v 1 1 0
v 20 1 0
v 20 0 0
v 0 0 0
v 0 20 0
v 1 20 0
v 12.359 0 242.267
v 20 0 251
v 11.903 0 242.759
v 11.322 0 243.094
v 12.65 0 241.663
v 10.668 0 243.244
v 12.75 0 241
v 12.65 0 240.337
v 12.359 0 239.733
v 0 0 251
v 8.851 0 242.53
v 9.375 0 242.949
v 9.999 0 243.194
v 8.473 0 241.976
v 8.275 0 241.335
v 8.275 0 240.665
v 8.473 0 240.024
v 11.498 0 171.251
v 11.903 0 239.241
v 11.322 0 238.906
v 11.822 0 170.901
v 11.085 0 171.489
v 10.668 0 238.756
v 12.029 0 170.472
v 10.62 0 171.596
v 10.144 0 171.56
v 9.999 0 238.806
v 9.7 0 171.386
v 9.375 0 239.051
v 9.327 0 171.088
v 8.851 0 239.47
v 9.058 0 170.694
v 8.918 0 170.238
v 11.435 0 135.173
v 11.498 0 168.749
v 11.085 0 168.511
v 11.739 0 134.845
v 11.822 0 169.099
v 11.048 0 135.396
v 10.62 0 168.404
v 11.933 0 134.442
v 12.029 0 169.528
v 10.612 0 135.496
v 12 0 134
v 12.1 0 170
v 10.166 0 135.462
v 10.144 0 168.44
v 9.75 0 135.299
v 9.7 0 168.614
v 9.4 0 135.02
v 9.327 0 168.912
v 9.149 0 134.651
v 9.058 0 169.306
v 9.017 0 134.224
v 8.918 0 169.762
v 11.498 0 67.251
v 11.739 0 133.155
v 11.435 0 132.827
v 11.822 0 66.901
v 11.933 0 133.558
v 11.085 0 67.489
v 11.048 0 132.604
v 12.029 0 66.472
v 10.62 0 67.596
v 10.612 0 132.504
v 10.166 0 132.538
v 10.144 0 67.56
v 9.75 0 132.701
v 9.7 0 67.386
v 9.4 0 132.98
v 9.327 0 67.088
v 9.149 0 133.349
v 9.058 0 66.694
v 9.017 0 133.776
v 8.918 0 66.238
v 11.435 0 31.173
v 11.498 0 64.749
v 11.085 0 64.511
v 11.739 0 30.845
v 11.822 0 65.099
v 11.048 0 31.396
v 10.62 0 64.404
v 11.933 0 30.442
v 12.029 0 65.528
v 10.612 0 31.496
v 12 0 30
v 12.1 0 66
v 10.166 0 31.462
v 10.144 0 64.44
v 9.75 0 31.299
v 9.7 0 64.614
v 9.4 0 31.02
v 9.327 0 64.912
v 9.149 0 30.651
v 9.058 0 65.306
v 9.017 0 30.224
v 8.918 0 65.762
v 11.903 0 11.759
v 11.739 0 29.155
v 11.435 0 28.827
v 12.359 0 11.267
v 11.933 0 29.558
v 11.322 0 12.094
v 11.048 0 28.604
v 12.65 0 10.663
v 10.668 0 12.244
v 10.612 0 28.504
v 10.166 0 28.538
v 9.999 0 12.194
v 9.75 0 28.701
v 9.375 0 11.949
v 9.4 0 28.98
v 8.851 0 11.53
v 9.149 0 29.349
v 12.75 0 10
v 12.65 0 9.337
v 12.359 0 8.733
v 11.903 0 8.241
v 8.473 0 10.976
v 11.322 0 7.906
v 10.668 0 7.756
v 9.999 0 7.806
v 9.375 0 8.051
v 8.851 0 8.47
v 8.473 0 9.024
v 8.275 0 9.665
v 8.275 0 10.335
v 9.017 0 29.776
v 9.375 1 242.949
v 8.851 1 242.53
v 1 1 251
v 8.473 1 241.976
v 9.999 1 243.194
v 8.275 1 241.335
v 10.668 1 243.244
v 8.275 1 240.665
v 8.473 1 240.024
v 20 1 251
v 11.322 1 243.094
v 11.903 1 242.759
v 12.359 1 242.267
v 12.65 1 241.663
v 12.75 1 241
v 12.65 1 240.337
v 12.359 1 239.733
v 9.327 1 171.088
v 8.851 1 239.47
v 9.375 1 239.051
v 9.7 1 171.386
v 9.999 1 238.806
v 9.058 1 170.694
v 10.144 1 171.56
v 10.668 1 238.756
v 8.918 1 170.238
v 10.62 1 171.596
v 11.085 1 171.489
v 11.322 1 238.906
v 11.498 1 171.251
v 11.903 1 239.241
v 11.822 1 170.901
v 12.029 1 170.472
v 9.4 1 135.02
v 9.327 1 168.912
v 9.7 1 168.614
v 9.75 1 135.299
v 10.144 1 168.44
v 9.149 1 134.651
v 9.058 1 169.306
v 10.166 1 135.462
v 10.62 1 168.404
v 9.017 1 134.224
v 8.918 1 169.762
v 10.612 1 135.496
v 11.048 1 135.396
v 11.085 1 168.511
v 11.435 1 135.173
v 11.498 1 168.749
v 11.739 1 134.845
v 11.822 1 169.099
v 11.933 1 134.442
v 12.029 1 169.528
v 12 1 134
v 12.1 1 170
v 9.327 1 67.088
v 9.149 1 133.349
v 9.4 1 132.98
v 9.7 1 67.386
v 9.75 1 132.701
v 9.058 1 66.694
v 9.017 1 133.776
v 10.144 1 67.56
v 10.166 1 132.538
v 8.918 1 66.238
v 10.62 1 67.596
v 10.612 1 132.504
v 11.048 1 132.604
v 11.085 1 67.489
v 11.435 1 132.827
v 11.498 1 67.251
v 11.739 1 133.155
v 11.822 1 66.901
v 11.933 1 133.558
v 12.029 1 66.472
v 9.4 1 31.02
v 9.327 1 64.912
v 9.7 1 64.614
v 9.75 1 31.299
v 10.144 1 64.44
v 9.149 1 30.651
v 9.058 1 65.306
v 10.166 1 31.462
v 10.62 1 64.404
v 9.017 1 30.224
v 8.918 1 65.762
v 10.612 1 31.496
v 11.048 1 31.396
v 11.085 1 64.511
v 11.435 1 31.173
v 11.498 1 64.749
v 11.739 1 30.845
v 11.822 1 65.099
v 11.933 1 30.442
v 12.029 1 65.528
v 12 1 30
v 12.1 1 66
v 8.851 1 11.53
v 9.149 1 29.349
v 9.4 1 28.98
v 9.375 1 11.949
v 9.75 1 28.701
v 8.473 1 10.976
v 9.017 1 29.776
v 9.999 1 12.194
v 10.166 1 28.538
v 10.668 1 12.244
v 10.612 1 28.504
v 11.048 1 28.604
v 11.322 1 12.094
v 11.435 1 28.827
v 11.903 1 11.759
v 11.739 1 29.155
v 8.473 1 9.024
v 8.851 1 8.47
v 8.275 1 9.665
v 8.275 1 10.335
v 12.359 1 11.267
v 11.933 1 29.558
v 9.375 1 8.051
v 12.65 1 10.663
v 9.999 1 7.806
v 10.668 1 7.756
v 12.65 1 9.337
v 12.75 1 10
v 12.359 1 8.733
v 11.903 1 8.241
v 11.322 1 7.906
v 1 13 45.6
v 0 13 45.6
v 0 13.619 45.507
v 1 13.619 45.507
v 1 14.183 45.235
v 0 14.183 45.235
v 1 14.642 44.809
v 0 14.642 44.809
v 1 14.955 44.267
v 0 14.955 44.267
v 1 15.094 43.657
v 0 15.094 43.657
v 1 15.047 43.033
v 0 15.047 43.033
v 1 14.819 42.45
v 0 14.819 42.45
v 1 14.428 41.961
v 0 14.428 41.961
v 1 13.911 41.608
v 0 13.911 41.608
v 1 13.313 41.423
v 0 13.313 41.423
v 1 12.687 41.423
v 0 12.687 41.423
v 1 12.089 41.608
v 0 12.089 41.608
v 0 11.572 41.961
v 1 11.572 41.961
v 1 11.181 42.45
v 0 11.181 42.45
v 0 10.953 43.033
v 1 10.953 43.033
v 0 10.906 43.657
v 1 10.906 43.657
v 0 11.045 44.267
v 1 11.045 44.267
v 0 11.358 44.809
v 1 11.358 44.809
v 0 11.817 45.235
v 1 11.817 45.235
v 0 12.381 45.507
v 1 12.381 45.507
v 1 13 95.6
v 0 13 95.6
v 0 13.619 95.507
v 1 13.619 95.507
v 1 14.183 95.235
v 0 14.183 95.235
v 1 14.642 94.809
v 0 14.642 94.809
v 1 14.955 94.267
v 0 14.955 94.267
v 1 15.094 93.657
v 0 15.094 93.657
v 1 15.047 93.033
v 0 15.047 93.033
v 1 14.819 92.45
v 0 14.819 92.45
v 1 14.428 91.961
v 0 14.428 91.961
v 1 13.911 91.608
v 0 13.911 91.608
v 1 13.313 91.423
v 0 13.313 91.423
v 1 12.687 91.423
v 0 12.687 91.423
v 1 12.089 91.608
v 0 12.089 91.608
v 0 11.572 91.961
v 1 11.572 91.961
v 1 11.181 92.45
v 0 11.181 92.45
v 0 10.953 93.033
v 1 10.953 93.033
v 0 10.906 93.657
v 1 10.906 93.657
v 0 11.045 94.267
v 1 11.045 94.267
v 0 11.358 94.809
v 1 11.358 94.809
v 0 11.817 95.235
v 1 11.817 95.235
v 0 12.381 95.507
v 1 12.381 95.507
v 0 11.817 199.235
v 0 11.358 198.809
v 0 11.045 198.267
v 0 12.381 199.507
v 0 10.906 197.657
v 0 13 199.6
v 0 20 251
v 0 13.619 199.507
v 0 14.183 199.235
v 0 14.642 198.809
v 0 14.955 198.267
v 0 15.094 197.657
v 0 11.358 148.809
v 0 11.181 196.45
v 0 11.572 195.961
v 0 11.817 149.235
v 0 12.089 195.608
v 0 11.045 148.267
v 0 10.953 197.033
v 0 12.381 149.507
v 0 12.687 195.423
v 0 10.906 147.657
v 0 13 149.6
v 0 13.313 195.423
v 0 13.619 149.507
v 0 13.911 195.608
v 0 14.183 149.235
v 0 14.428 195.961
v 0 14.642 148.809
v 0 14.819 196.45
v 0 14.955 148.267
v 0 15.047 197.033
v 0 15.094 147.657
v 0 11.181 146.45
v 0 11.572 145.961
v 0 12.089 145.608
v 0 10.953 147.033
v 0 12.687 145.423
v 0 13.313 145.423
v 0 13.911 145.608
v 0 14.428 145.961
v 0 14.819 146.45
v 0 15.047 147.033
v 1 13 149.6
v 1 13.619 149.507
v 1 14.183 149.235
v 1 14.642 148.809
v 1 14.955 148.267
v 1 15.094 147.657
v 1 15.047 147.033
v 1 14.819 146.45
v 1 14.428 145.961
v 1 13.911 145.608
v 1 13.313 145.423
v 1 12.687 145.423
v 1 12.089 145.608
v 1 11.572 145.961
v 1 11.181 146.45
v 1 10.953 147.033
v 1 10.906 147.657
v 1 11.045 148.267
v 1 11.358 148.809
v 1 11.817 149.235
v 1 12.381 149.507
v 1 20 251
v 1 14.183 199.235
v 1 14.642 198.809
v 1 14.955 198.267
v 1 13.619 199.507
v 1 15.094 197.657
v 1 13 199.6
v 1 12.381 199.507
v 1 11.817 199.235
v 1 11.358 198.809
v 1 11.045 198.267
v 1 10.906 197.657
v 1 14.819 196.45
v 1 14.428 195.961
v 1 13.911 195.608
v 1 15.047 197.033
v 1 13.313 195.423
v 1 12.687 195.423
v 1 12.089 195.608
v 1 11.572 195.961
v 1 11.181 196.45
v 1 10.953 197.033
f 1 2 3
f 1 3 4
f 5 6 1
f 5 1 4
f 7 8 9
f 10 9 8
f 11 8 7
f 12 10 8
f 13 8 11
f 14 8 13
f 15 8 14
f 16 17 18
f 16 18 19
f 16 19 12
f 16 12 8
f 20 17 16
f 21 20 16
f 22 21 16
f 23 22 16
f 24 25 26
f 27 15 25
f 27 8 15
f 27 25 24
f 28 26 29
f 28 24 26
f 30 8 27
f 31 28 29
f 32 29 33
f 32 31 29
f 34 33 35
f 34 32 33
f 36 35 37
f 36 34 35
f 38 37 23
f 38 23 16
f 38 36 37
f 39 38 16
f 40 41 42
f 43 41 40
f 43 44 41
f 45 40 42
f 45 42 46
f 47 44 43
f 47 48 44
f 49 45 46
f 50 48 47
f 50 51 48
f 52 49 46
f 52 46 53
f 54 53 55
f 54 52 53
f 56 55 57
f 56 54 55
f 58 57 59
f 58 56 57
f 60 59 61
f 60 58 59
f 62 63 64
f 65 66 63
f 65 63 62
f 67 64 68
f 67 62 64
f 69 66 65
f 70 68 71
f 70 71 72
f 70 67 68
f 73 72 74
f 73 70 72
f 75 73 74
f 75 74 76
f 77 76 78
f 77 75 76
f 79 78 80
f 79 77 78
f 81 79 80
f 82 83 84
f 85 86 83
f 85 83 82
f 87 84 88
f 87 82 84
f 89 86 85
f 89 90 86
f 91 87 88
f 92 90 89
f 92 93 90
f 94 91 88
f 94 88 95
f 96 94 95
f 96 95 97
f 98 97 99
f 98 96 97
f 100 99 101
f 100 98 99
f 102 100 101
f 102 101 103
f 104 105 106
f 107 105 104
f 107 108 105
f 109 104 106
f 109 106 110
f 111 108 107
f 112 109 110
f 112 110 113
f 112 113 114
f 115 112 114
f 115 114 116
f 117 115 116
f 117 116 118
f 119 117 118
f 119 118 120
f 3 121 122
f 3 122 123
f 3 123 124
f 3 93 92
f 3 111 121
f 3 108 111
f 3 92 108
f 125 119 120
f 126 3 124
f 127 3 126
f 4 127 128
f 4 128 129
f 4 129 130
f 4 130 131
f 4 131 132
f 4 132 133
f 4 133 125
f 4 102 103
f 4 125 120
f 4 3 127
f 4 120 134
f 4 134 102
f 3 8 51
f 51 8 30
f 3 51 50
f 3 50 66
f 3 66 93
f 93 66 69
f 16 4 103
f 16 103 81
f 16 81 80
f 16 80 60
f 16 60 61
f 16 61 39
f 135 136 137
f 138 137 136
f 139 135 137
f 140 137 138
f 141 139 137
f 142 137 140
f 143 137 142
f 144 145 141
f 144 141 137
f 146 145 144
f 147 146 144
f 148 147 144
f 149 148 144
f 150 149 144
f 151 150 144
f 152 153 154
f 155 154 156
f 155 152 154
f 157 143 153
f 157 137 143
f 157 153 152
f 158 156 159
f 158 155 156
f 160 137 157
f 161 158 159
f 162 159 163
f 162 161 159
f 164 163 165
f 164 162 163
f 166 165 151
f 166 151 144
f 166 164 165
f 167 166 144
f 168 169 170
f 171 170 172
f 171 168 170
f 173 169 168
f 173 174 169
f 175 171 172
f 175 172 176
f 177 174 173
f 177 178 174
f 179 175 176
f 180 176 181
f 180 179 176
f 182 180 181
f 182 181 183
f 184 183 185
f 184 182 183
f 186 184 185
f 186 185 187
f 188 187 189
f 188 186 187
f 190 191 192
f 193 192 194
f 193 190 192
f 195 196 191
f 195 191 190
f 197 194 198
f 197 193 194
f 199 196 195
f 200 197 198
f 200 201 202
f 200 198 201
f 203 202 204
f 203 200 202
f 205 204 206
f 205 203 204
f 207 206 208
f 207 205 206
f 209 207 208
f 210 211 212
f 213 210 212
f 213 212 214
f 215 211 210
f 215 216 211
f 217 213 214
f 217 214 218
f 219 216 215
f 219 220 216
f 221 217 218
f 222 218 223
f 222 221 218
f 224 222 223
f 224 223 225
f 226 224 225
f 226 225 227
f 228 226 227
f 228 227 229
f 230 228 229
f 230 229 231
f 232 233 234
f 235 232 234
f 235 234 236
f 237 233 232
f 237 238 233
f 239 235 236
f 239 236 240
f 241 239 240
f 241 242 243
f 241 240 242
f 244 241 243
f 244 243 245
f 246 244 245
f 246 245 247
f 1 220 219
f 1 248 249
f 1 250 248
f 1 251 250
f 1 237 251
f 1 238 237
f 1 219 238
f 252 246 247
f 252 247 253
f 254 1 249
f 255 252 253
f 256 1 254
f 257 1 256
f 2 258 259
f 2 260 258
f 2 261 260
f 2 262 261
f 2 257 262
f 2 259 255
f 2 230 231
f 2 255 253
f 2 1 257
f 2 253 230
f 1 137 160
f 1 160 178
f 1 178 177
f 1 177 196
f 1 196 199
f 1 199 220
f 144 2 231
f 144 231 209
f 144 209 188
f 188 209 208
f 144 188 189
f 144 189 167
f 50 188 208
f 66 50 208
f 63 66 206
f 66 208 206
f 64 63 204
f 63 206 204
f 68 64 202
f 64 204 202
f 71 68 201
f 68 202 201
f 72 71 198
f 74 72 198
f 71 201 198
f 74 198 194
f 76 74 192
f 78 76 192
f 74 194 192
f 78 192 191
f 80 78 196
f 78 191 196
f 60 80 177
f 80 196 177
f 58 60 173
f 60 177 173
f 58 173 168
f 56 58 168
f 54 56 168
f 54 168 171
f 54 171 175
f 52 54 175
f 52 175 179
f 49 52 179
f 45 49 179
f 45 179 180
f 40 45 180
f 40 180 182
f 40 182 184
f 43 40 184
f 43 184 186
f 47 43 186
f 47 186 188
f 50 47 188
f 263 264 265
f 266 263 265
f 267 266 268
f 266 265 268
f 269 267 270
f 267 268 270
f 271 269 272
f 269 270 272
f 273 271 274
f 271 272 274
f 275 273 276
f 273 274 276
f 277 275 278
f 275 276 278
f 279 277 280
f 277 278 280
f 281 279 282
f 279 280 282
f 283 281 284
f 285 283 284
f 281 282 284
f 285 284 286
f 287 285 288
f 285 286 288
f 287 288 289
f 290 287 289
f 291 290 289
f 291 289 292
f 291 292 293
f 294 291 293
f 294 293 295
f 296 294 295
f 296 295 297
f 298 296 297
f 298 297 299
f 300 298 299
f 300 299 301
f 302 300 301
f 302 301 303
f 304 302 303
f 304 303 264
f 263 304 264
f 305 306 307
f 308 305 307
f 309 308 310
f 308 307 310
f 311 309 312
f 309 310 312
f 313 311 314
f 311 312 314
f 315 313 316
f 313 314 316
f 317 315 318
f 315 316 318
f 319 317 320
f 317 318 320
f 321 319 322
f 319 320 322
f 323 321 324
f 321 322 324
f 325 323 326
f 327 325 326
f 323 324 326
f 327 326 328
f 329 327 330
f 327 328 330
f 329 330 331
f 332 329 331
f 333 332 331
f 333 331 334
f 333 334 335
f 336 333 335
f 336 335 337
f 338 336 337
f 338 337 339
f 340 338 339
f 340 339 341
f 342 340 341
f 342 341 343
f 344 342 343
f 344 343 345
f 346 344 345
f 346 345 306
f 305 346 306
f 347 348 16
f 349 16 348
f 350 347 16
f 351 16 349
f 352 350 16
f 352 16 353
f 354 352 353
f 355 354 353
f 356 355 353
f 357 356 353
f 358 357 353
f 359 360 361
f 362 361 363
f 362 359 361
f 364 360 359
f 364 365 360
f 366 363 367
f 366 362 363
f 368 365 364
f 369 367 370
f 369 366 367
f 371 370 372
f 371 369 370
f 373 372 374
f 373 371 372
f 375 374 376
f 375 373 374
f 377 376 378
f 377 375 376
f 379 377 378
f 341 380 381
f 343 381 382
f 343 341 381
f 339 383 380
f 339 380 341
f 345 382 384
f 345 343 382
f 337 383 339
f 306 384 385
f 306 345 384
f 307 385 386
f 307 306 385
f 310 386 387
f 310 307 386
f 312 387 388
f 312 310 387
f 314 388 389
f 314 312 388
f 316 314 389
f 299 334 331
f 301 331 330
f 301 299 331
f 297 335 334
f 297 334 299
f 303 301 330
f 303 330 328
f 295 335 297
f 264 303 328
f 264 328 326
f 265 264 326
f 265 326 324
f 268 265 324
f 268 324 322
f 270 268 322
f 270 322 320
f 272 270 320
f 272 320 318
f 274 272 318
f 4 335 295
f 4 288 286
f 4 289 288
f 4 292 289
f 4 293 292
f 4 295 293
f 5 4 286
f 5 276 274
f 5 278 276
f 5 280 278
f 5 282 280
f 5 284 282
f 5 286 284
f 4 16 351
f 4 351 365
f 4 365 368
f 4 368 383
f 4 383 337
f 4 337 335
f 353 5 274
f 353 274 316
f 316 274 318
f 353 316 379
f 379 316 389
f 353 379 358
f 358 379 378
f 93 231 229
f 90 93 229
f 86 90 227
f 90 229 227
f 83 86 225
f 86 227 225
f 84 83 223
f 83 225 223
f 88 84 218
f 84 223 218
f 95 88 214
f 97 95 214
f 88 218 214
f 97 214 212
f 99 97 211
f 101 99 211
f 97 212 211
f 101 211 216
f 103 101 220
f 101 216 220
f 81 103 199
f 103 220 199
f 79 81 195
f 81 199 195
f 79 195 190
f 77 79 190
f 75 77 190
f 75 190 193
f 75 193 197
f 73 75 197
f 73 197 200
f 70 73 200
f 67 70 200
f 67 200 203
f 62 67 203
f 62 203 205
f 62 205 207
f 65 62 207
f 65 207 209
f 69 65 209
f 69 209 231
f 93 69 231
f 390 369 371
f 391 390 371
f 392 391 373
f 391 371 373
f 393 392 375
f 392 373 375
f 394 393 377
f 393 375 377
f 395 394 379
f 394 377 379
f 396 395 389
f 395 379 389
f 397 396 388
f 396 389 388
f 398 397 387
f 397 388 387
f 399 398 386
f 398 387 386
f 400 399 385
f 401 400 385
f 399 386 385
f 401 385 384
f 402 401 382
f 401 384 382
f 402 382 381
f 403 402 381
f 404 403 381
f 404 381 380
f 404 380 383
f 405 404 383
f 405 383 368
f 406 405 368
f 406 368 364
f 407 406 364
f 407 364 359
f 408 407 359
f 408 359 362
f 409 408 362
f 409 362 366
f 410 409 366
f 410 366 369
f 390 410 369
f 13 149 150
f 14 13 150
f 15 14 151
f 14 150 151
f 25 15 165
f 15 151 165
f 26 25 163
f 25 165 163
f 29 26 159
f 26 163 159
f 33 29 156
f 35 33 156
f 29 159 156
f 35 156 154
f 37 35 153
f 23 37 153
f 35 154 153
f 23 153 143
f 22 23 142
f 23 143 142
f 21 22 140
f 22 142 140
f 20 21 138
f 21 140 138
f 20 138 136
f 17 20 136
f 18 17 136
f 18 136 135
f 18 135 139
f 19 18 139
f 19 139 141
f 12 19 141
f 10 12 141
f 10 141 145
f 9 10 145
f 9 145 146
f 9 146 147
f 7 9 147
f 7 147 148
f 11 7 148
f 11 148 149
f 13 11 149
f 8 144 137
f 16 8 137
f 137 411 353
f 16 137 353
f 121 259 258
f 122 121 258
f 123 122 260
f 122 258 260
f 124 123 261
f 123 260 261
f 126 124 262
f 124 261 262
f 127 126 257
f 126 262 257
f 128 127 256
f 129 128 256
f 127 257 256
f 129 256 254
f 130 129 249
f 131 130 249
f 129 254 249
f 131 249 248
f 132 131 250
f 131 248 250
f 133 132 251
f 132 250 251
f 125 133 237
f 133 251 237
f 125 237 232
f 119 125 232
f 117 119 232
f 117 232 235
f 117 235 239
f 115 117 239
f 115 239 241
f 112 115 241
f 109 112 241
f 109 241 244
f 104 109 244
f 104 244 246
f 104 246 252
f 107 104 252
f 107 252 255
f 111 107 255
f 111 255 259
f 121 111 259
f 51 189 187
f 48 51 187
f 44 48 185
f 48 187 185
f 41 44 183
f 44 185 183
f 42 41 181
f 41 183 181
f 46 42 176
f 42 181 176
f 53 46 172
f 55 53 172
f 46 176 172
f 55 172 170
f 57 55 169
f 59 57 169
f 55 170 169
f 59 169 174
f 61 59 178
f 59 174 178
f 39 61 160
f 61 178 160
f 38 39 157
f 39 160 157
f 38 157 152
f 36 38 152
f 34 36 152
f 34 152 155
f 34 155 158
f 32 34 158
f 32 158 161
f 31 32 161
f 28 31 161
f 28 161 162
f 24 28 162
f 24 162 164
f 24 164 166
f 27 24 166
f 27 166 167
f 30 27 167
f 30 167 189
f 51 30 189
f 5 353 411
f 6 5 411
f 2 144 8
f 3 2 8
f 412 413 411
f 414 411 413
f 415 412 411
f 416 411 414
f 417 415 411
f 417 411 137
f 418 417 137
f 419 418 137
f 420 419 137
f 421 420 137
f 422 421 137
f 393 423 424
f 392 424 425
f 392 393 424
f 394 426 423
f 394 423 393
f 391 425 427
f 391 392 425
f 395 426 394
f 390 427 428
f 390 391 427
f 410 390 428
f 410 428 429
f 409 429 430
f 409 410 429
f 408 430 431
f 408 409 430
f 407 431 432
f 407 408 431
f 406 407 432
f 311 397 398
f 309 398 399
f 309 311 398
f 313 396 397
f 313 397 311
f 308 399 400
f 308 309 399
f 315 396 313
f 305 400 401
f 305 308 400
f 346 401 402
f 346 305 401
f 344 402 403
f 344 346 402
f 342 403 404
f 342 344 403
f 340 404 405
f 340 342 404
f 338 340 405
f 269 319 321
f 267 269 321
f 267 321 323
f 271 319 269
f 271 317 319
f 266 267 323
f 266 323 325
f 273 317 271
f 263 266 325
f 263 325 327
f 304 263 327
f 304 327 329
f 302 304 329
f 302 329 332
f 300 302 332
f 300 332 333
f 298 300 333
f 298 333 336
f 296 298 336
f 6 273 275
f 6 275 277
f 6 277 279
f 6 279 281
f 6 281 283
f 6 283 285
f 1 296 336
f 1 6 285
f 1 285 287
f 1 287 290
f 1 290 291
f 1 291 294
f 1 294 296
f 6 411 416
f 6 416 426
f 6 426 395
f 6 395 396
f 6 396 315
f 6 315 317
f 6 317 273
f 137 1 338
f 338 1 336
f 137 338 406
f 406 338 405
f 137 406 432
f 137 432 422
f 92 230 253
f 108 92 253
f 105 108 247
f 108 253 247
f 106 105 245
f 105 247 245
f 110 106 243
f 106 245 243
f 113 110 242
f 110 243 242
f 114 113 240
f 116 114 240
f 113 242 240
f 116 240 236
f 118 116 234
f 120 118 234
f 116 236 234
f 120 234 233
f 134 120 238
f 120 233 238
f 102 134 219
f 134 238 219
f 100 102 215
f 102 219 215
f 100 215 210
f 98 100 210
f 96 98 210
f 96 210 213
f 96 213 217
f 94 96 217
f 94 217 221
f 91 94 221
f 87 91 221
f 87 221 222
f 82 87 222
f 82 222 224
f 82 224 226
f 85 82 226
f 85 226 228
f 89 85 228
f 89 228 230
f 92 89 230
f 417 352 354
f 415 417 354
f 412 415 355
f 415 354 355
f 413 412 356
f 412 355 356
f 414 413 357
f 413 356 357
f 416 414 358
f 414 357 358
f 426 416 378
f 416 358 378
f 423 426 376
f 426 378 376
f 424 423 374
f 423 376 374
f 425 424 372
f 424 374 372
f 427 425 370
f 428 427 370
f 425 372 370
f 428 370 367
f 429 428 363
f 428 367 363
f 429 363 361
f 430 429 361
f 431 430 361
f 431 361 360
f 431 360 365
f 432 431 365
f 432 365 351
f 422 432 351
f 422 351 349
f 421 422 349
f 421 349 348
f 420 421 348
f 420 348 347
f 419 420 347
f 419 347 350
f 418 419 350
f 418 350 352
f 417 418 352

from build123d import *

# Parameters (mm, degrees)
EXTRUDE_1_DEPTH     = 251
SKETCH_3_R          = 1.5
SKETCH_3_R_2        = 1.6
CUT_EXTRUDE_1_DEPTH = 2
SKETCH_4_R          = 2.1
CUT_EXTRUDE_2_DEPTH = 21
SKETCH_5_R          = 2.25
CUT_EXTRUDE_3_DEPTH = 2


with BuildPart() as part:
    # Эскиз1 → Бобышка-Вытянуть1 (new body)
    with BuildSketch(Plane.XY):
        Polygon((0, 0), (0, 20), (1, 20), (1, 1), (20, 1), (20, 0), align=None)
    extrude(amount=EXTRUDE_1_DEPTH)

    # Эскиз3 → Вырез-Вытянуть1 (cut, through all)
    with BuildSketch(Plane(origin=(0, 1, 0), x_dir=(1, 0, 0), z_dir=(0, 1, 0))):
        with Locations((10.5, -134)):
            Circle(SKETCH_3_R)
        with Locations((10.5, -170)):
            Circle(SKETCH_3_R_2)
        with Locations((10.5, -66)):
            Circle(SKETCH_3_R_2)
        with Locations((10.5, -30)):
            Circle(SKETCH_3_R)
    extrude(amount=-CUT_EXTRUDE_1_DEPTH, mode=Mode.SUBTRACT)

    # Эскиз4 → Вырез-Вытянуть2 (cut, through all)
    with BuildSketch(Plane.ZY):
        with Locations((43.5, 13)):
            Circle(SKETCH_4_R)
        with Locations((93.5, 13)):
            Circle(SKETCH_4_R)
        with Locations((147.5, 13)):
            Circle(SKETCH_4_R)
        with Locations((197.5, 13)):
            Circle(SKETCH_4_R)
    extrude(amount=-CUT_EXTRUDE_2_DEPTH, mode=Mode.SUBTRACT)

    # Эскиз5 → Вырез-Вытянуть3 (cut, through all)
    with BuildSketch(Plane(origin=(0, 1, 0), x_dir=(1, 0, 0), z_dir=(0, 1, 0))):
        with Locations((10.5, -10)):
            Circle(SKETCH_5_R)
        with Locations((10.5, -241)):
            Circle(SKETCH_5_R)
    extrude(amount=-CUT_EXTRUDE_3_DEPTH, mode=Mode.SUBTRACT)


solid = part.part
